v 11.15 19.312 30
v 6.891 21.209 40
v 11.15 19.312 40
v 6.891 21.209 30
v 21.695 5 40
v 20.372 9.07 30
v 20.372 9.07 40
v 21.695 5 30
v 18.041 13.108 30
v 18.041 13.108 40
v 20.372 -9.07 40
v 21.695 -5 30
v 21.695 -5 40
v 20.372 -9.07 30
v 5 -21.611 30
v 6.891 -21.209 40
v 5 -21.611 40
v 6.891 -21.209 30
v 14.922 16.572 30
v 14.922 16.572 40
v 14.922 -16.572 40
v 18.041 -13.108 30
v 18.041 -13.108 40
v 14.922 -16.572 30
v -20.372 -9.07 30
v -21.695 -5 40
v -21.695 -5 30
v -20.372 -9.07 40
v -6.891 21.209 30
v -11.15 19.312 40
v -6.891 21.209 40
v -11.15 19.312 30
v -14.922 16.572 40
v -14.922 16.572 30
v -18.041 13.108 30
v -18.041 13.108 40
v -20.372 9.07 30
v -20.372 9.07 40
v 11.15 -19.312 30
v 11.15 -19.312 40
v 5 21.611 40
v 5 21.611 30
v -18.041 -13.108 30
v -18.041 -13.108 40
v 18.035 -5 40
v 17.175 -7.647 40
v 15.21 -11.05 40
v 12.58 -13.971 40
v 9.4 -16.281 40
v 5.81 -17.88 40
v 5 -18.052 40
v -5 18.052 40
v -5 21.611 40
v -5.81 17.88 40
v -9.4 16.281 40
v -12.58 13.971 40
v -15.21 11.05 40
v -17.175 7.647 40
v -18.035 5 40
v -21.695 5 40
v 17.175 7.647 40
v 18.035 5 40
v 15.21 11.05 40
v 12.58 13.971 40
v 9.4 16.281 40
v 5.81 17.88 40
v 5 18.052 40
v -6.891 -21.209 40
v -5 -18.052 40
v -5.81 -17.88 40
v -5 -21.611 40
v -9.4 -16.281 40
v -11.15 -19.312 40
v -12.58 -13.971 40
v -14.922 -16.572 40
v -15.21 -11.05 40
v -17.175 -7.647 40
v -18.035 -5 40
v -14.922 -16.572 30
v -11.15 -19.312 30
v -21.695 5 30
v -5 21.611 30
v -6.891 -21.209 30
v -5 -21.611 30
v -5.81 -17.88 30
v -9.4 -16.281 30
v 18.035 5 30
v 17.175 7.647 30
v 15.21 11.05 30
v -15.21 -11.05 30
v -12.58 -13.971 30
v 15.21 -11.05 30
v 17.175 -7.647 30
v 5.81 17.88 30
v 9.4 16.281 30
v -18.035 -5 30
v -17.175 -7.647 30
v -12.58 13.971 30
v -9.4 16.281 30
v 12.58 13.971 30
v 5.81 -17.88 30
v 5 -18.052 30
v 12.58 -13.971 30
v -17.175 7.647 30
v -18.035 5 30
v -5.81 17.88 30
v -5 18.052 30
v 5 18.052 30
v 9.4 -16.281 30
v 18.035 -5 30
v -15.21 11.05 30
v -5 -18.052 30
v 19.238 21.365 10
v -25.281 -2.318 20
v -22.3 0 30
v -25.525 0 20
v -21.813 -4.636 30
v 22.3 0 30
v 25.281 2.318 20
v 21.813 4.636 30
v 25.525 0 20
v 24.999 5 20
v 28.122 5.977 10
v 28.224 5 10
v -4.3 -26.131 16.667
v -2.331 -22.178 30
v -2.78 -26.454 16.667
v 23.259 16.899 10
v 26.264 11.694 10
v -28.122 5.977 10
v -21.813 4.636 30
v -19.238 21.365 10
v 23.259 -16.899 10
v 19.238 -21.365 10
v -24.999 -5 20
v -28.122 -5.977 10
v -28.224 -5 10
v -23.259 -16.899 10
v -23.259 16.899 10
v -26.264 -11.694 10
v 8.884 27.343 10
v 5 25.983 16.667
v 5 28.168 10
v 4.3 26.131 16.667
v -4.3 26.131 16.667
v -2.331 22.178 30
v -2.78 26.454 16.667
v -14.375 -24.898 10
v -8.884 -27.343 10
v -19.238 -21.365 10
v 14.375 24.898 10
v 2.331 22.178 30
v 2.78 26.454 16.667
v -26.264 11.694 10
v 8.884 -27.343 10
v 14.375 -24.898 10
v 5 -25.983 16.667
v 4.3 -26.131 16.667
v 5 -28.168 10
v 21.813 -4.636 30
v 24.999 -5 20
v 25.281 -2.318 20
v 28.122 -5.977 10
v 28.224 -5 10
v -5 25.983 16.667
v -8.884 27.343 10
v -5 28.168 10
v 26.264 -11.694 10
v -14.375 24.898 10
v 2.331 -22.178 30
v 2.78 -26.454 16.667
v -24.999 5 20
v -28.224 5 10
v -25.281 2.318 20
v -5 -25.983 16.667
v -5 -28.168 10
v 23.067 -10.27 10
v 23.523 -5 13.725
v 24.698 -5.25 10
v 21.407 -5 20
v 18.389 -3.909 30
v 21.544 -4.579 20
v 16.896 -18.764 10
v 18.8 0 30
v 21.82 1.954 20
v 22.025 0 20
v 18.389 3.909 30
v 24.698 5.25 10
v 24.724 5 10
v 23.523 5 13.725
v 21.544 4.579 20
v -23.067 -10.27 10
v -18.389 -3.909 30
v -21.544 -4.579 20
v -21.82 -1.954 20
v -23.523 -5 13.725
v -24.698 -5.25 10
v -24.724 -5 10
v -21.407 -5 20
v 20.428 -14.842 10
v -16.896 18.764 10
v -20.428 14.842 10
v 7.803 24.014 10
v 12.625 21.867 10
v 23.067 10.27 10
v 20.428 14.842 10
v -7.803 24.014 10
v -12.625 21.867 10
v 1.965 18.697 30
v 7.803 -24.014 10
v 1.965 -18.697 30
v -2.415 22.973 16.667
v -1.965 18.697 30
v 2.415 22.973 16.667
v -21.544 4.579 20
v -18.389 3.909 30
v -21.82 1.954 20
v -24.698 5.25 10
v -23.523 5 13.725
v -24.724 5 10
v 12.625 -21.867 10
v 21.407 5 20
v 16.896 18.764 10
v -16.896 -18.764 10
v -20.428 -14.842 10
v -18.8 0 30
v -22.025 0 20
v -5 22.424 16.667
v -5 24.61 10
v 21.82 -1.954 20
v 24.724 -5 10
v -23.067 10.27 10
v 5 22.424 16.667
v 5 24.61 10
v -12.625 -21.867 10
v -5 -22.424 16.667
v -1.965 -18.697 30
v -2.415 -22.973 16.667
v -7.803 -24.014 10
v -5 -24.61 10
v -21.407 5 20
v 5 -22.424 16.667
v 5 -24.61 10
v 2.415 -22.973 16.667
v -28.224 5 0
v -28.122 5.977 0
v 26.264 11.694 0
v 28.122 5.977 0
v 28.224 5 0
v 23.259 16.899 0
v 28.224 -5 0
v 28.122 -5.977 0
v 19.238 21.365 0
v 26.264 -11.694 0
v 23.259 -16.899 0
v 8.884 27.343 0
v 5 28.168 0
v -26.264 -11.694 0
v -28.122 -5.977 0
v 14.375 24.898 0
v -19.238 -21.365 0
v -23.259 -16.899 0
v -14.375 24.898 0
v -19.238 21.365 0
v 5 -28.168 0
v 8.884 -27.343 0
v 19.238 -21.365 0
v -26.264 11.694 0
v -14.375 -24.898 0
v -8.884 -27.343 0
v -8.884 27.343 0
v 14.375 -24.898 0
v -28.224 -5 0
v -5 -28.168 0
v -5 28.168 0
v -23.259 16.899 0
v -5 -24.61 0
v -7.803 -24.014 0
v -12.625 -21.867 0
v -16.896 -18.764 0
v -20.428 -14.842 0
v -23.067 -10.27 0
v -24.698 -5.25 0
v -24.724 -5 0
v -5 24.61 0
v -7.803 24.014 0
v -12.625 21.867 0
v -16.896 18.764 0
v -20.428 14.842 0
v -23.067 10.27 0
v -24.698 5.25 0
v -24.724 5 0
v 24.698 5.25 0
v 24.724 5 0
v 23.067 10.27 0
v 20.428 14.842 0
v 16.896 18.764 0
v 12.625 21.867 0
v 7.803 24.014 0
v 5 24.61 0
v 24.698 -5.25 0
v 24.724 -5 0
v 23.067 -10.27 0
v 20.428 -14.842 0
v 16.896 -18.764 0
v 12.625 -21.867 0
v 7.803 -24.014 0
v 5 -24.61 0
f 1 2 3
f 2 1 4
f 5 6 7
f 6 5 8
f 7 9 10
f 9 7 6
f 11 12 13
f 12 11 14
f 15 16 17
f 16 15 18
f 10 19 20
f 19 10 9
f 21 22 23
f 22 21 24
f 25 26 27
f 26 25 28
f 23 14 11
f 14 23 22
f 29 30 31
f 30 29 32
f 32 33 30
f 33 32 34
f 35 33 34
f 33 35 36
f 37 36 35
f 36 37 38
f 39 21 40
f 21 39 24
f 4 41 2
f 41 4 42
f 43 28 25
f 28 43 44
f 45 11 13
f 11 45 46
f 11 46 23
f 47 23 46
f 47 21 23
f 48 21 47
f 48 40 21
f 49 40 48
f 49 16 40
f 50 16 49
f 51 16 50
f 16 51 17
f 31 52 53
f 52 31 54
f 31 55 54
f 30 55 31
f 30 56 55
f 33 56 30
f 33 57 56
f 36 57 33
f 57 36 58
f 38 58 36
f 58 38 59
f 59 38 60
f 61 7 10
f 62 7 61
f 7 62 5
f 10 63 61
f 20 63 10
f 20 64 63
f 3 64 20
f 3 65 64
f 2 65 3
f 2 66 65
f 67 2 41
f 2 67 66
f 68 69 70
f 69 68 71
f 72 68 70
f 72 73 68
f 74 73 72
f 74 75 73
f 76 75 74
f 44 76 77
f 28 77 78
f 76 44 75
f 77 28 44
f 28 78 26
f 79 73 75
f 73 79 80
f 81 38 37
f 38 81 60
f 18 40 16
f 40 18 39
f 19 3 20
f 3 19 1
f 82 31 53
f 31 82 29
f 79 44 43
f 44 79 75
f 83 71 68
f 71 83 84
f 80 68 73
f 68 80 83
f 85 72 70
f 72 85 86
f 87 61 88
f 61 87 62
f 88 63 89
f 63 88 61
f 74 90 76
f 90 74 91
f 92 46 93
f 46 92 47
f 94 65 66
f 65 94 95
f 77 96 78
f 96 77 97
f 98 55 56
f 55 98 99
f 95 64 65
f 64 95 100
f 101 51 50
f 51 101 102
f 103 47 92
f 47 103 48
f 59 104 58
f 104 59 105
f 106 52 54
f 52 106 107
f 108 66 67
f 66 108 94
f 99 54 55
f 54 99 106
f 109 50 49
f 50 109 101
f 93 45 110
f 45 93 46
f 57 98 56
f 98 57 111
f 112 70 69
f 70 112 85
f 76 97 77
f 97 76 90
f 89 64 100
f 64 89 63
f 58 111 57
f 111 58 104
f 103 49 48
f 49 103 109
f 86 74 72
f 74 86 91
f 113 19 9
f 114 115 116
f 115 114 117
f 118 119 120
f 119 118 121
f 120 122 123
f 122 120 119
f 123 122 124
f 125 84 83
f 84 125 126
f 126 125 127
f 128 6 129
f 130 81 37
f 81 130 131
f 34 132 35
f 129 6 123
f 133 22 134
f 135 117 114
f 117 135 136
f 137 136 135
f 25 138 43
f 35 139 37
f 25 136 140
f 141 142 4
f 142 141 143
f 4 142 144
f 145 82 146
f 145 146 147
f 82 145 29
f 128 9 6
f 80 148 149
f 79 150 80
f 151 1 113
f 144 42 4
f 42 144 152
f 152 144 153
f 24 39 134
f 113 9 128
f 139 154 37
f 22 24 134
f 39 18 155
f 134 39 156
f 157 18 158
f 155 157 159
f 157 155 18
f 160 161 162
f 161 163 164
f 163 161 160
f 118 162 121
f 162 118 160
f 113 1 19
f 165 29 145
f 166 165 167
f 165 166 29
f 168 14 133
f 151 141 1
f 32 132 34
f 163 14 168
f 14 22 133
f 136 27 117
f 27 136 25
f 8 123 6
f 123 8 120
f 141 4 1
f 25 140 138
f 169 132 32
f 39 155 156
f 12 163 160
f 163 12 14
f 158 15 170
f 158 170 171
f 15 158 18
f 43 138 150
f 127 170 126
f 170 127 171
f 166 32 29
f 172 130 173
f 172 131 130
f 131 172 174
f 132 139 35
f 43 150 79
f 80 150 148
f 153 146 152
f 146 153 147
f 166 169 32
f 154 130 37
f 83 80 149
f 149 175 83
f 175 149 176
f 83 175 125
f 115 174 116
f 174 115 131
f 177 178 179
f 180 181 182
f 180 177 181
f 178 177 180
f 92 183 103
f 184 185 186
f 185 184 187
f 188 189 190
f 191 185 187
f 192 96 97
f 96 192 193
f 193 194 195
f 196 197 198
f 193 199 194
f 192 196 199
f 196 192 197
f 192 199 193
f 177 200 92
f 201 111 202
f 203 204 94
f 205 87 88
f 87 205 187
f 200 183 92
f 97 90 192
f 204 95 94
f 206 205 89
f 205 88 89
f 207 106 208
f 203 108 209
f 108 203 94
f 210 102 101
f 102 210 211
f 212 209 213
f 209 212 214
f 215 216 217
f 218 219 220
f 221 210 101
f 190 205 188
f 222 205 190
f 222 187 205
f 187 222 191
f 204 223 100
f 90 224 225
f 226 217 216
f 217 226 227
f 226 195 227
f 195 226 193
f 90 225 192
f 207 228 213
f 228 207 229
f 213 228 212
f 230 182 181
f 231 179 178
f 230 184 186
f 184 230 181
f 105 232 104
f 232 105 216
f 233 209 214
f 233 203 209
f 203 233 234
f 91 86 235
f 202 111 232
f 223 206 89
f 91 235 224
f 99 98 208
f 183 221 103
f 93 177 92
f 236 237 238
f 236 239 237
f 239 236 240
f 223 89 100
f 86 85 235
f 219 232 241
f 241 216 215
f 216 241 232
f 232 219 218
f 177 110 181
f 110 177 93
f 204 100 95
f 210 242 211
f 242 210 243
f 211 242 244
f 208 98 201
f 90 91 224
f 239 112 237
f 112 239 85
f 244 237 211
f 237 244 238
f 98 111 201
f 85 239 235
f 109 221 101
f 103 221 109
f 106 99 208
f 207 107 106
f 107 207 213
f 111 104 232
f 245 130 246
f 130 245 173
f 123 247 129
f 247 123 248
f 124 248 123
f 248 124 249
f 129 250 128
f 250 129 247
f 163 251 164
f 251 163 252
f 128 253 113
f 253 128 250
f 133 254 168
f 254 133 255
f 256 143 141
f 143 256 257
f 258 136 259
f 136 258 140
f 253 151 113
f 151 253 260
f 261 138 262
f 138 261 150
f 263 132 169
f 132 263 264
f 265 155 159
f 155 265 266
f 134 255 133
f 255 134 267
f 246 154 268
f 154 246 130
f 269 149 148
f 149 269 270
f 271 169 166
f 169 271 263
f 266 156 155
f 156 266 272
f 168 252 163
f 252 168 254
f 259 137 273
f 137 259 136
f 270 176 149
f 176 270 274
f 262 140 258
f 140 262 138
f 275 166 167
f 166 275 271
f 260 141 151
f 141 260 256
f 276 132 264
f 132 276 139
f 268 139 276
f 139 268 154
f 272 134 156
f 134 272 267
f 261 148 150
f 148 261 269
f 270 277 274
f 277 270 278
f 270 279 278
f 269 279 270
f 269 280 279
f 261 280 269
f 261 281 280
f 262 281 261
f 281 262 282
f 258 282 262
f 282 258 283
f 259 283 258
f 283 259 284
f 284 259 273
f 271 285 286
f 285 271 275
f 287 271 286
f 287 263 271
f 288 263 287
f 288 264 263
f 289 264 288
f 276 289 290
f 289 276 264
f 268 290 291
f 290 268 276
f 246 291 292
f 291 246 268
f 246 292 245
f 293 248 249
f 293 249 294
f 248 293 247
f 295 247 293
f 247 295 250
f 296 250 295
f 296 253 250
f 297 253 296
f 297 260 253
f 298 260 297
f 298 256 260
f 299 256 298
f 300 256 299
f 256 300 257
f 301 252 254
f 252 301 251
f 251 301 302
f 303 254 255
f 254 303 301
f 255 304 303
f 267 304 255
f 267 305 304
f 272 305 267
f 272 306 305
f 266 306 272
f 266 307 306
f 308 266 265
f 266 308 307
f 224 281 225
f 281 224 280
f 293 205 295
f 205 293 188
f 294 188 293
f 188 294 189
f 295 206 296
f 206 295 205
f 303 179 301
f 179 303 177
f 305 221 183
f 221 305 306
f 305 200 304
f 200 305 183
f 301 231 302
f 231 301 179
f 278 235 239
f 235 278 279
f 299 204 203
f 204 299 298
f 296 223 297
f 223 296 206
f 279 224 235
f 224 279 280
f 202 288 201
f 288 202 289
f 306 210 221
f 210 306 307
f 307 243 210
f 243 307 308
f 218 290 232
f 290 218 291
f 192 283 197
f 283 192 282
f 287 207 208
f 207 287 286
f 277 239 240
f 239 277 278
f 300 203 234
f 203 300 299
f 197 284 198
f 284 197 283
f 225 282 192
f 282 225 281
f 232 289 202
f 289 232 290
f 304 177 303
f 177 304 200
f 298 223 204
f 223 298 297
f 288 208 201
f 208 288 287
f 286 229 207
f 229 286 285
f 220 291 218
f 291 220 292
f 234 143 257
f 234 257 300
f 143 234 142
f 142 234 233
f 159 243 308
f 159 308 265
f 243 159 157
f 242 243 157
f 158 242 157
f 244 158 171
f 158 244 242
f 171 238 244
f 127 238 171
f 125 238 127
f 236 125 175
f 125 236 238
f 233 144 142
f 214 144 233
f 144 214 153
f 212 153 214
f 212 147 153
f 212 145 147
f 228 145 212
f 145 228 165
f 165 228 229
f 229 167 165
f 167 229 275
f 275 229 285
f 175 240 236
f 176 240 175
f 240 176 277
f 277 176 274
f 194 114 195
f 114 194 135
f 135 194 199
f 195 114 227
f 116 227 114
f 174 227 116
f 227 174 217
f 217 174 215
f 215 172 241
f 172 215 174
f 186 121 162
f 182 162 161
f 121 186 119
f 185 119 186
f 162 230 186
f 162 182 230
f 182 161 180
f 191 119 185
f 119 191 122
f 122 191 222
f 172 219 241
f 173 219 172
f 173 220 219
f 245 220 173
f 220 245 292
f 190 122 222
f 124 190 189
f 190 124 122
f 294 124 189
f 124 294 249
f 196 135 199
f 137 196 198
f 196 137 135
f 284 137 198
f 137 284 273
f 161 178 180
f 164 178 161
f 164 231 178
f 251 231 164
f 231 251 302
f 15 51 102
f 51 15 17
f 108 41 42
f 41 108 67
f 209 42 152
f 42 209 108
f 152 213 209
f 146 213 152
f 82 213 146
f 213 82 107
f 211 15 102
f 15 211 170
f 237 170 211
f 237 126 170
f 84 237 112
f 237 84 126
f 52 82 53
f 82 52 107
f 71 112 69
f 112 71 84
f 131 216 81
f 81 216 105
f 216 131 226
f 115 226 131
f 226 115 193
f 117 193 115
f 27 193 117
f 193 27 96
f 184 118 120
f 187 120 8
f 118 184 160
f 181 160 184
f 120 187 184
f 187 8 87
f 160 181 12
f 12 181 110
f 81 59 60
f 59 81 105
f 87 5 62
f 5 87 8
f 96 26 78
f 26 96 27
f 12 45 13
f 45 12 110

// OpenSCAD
//A mount designed to connect an MR16 led lamp to the end of the lens of my 16mm projector. 
//You will need to modify the diameters to fit your own parts.

lens_diameter=36.6;
bulb_diameter=49.5;
height=10;
coneheight=20;
insidetop=lens_diameter/2+.5;
outsidetop=lens_diameter/2+4;  
insidebottom=bulb_diameter/2+.5;
outsidebottom=bulb_diameter/2+4;
difference(){
    union(){
        translate([0,0,height+coneheight]){
            difference(){
                cylinder (h=height, r=outsidetop );
                cylinder (h=height, r=insidetop);}
            }
        translate([0,0,height]){
            difference(){
                cylinder(h=coneheight, r1=outsidebottom, r2=outsidetop);
                cylinder(h=coneheight, r1=insidebottom, r2=insidetop);}
            }
        difference(){
            cylinder (h=height, r=outsidebottom);
            cylinder (h=height, r=insidebottom);}
         }
    //Subtract cutouts from cylinders surrounding lens and bulb, to allow more 'give' when connecting mount and lamp/lens
    translate([-5,-50,0]) cube([10,100,height+1/3*coneheight]);
    translate([-50,-5,0]) cube([100,10,coneheight]);
    translate([-5,-50,height+coneheight]) cube([10,100,coneheight]);
    translate([-50,-5,height+coneheight]) cube([100,10,coneheight]);


}
